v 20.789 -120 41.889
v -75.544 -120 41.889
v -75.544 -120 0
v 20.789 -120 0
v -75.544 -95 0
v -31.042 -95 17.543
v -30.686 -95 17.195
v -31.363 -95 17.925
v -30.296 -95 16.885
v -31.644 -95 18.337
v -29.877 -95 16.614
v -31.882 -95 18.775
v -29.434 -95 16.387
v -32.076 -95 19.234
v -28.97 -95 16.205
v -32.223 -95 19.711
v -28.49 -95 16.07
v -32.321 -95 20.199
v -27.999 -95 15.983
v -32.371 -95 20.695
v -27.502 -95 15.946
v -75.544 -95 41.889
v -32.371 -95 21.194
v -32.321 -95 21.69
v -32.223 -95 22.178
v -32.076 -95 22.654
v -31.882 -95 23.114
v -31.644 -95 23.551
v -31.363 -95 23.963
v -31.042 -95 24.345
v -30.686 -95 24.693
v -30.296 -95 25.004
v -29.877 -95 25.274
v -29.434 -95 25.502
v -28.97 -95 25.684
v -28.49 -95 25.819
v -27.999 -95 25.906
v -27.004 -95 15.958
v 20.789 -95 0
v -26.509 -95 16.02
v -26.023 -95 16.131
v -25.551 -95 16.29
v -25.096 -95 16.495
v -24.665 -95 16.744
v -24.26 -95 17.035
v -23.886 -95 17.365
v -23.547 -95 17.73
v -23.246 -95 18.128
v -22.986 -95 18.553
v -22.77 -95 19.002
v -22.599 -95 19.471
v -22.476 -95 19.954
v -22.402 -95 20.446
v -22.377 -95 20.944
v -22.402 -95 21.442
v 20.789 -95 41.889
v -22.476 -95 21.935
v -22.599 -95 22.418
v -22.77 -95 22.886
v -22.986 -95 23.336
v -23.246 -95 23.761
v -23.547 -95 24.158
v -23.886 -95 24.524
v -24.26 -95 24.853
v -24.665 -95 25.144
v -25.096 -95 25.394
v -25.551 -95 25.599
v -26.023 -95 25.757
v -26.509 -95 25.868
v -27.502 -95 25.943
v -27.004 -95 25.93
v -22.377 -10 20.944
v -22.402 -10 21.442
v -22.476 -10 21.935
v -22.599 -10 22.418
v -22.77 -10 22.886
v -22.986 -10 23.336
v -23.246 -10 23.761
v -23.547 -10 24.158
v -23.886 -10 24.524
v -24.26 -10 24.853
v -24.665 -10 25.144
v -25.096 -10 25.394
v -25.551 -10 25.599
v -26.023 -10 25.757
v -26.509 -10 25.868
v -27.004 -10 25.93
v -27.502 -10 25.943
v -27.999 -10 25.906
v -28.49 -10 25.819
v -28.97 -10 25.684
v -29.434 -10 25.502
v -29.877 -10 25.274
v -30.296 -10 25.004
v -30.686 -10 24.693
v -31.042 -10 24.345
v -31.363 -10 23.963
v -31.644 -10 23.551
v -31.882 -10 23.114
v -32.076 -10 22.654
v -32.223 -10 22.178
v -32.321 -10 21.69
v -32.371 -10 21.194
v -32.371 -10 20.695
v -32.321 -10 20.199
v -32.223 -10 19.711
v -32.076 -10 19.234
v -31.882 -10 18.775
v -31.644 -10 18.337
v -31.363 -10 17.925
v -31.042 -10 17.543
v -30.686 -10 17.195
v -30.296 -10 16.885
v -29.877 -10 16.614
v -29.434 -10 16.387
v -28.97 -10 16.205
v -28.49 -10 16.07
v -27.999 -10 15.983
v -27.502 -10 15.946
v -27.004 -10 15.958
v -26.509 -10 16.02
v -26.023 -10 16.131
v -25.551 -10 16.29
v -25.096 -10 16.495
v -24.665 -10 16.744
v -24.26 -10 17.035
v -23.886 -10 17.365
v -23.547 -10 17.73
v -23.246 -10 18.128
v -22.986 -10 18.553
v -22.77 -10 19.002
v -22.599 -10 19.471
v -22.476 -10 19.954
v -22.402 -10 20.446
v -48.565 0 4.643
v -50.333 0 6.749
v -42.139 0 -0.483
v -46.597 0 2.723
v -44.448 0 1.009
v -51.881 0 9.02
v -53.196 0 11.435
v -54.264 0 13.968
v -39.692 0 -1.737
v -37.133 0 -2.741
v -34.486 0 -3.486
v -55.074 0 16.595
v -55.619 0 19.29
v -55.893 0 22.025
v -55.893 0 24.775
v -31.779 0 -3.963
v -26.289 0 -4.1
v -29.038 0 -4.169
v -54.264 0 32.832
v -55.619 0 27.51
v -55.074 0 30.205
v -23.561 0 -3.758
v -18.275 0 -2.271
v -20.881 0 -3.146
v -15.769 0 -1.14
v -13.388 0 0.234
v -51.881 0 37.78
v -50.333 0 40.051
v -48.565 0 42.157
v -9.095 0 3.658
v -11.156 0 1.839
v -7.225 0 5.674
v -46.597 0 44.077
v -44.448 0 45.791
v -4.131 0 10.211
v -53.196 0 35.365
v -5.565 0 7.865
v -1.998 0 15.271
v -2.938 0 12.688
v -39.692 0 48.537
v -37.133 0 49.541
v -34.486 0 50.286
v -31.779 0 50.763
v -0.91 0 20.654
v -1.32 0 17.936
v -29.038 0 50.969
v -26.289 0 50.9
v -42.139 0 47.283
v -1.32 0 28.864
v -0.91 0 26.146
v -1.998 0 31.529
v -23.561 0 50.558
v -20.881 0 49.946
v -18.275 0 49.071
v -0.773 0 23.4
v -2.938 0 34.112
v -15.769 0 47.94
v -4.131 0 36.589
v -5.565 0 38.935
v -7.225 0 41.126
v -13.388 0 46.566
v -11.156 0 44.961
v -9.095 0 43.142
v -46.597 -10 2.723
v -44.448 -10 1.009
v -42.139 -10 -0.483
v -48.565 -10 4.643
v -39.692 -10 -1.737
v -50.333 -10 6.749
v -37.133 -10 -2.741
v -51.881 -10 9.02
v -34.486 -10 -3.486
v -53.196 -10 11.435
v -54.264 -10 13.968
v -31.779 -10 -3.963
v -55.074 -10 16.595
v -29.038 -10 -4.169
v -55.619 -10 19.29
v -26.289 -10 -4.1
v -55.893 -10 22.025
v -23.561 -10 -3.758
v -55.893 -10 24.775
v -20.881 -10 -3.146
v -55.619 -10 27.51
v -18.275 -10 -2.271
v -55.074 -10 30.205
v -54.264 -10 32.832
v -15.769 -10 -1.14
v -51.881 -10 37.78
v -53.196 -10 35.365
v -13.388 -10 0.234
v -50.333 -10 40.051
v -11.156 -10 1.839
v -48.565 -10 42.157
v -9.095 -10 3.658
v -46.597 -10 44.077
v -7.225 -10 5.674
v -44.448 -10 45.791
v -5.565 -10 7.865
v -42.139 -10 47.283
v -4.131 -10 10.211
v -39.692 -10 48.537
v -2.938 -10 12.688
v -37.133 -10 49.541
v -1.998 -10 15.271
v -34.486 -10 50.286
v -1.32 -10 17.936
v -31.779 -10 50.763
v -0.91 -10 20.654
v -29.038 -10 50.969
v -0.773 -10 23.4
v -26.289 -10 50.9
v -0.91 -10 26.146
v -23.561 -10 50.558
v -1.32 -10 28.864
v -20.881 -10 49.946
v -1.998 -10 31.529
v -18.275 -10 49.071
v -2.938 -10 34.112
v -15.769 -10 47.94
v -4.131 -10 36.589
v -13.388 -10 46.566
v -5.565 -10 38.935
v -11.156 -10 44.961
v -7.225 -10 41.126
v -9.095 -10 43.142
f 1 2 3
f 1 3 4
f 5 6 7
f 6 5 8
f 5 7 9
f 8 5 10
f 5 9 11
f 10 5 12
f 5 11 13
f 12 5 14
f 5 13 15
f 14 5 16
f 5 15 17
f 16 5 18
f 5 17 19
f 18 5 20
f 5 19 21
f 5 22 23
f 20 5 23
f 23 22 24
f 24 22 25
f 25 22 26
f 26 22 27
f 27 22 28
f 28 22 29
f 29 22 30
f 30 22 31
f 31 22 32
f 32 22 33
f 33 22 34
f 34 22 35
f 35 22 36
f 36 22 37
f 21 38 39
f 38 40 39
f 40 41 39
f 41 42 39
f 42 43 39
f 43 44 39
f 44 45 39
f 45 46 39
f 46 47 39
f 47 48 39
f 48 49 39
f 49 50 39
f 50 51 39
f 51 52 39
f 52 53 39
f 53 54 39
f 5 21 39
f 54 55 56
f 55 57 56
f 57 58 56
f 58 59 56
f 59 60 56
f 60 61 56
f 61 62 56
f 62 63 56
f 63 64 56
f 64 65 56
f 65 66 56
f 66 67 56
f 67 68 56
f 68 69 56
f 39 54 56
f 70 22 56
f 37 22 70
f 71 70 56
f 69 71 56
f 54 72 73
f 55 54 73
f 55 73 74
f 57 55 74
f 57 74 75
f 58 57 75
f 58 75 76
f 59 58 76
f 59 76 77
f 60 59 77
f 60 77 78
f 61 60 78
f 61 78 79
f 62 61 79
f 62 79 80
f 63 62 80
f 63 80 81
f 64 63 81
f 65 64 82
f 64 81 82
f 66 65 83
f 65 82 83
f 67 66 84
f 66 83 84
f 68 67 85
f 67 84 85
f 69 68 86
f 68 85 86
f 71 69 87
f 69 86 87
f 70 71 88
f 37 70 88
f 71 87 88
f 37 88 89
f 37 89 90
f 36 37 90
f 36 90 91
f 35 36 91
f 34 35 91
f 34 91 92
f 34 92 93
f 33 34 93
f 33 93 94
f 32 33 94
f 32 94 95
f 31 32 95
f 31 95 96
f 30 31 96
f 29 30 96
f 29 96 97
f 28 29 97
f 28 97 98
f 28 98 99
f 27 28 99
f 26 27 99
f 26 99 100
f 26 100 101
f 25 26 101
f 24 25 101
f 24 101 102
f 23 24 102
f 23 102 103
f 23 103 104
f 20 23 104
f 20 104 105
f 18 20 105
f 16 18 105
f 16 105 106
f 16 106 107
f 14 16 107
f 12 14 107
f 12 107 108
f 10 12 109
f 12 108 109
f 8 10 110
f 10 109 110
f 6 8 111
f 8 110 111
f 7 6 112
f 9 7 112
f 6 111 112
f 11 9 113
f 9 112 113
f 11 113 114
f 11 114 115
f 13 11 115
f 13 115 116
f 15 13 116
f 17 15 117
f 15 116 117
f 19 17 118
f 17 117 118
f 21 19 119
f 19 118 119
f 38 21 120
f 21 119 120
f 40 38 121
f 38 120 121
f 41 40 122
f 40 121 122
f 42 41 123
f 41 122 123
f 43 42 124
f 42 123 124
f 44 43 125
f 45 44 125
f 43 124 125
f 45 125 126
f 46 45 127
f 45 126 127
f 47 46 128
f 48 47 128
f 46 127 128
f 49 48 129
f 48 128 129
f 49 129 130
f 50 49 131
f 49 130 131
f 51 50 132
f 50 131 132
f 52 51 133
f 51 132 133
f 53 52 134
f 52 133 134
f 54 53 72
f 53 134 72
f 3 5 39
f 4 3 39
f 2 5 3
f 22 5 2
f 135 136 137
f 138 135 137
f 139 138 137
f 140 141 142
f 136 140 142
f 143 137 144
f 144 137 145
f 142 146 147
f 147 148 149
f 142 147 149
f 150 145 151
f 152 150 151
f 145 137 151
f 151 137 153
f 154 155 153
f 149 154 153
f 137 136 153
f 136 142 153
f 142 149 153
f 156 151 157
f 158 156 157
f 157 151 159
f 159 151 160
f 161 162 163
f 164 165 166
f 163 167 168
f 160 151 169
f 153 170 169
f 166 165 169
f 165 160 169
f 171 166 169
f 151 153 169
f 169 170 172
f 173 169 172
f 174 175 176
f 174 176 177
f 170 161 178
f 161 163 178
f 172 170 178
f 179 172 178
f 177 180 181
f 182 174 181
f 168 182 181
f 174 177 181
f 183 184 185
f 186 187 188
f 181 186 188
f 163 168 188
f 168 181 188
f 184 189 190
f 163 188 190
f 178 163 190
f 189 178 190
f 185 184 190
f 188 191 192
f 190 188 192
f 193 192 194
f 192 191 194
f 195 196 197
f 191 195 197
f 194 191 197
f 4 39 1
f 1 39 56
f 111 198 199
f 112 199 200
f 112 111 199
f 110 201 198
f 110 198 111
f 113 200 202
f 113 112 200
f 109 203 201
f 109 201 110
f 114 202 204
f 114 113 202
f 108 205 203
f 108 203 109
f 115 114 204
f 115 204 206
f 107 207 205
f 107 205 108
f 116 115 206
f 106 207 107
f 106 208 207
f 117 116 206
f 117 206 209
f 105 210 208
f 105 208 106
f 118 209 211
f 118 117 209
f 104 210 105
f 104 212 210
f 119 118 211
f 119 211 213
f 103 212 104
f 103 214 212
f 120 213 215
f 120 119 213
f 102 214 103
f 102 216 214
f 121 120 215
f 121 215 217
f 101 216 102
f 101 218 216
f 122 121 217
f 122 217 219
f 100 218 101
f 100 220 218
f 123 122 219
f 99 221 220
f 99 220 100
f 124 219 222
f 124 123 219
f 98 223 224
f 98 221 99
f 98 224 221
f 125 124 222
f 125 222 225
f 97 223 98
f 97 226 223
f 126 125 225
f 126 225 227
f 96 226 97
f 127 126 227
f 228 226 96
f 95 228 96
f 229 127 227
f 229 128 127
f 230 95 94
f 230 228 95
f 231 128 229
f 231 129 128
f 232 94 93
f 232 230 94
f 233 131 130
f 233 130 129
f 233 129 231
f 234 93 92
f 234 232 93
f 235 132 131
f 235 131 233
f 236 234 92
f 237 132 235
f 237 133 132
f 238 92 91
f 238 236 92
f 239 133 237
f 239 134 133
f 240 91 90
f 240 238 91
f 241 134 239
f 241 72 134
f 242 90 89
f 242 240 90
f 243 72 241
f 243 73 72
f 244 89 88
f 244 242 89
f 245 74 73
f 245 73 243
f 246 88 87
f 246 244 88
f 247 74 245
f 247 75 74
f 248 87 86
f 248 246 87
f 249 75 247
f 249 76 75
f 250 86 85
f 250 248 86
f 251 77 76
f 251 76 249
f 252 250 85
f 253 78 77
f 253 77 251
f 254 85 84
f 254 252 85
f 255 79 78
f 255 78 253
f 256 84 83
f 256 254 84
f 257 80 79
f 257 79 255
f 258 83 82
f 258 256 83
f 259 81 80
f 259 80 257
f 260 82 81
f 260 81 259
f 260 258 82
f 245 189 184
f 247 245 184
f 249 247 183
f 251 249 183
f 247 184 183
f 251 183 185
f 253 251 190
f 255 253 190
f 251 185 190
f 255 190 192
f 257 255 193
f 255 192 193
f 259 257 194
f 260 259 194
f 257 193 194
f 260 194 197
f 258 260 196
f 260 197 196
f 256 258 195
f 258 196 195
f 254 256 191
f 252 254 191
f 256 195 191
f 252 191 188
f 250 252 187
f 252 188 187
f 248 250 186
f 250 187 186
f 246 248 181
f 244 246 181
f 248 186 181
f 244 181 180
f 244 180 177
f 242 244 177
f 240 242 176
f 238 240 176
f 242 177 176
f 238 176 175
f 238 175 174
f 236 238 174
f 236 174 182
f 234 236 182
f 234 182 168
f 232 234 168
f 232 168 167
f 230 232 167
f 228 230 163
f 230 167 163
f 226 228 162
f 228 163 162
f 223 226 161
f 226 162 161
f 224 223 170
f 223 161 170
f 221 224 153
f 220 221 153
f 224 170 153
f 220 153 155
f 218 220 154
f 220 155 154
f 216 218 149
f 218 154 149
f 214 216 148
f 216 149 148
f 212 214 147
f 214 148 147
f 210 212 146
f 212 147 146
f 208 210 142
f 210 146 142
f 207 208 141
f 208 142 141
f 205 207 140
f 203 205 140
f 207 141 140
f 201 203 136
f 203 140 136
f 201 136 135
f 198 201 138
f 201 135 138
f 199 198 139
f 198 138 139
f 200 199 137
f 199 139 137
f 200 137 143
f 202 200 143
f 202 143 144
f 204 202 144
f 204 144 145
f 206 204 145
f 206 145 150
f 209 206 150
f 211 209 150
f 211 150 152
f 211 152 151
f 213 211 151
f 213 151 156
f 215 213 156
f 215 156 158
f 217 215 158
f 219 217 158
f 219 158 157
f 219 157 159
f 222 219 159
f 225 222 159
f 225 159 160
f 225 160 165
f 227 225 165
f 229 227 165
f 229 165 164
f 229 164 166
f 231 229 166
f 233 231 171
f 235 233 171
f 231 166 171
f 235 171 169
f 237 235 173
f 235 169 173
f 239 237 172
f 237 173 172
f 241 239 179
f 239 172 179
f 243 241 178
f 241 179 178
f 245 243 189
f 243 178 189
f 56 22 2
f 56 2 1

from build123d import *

# Parameters (mm, degrees)
F0_R     = 27.577165
F1_DEPTH = 10
F2_R     = 5
F3_DEPTH = 95
F4_W     = 96.332805
F4_H     = 41.888617
F5_DEPTH = 25


with BuildPart() as f1:
    # F0 (on Front) → F1 (new body)
    with BuildSketch(Plane.XZ):
        with Locations((-28.350001, 23.400001)):
            Circle(F0_R)
    extrude(amount=F1_DEPTH)

    # F2 (on Front) → F3 (join)
    with BuildSketch(Plane.XZ):
        with Locations((-27.377238, 20.944308)):
            Circle(F2_R)
    extrude(amount=F3_DEPTH)

    # F4 (on face) → F5 (join)
    with BuildSketch(Plane.XZ.offset(95)):
        with Locations((-27.377238, 20.944308)):
            Rectangle(F4_W, F4_H)
    extrude(amount=F5_DEPTH)


solid = f1.part
